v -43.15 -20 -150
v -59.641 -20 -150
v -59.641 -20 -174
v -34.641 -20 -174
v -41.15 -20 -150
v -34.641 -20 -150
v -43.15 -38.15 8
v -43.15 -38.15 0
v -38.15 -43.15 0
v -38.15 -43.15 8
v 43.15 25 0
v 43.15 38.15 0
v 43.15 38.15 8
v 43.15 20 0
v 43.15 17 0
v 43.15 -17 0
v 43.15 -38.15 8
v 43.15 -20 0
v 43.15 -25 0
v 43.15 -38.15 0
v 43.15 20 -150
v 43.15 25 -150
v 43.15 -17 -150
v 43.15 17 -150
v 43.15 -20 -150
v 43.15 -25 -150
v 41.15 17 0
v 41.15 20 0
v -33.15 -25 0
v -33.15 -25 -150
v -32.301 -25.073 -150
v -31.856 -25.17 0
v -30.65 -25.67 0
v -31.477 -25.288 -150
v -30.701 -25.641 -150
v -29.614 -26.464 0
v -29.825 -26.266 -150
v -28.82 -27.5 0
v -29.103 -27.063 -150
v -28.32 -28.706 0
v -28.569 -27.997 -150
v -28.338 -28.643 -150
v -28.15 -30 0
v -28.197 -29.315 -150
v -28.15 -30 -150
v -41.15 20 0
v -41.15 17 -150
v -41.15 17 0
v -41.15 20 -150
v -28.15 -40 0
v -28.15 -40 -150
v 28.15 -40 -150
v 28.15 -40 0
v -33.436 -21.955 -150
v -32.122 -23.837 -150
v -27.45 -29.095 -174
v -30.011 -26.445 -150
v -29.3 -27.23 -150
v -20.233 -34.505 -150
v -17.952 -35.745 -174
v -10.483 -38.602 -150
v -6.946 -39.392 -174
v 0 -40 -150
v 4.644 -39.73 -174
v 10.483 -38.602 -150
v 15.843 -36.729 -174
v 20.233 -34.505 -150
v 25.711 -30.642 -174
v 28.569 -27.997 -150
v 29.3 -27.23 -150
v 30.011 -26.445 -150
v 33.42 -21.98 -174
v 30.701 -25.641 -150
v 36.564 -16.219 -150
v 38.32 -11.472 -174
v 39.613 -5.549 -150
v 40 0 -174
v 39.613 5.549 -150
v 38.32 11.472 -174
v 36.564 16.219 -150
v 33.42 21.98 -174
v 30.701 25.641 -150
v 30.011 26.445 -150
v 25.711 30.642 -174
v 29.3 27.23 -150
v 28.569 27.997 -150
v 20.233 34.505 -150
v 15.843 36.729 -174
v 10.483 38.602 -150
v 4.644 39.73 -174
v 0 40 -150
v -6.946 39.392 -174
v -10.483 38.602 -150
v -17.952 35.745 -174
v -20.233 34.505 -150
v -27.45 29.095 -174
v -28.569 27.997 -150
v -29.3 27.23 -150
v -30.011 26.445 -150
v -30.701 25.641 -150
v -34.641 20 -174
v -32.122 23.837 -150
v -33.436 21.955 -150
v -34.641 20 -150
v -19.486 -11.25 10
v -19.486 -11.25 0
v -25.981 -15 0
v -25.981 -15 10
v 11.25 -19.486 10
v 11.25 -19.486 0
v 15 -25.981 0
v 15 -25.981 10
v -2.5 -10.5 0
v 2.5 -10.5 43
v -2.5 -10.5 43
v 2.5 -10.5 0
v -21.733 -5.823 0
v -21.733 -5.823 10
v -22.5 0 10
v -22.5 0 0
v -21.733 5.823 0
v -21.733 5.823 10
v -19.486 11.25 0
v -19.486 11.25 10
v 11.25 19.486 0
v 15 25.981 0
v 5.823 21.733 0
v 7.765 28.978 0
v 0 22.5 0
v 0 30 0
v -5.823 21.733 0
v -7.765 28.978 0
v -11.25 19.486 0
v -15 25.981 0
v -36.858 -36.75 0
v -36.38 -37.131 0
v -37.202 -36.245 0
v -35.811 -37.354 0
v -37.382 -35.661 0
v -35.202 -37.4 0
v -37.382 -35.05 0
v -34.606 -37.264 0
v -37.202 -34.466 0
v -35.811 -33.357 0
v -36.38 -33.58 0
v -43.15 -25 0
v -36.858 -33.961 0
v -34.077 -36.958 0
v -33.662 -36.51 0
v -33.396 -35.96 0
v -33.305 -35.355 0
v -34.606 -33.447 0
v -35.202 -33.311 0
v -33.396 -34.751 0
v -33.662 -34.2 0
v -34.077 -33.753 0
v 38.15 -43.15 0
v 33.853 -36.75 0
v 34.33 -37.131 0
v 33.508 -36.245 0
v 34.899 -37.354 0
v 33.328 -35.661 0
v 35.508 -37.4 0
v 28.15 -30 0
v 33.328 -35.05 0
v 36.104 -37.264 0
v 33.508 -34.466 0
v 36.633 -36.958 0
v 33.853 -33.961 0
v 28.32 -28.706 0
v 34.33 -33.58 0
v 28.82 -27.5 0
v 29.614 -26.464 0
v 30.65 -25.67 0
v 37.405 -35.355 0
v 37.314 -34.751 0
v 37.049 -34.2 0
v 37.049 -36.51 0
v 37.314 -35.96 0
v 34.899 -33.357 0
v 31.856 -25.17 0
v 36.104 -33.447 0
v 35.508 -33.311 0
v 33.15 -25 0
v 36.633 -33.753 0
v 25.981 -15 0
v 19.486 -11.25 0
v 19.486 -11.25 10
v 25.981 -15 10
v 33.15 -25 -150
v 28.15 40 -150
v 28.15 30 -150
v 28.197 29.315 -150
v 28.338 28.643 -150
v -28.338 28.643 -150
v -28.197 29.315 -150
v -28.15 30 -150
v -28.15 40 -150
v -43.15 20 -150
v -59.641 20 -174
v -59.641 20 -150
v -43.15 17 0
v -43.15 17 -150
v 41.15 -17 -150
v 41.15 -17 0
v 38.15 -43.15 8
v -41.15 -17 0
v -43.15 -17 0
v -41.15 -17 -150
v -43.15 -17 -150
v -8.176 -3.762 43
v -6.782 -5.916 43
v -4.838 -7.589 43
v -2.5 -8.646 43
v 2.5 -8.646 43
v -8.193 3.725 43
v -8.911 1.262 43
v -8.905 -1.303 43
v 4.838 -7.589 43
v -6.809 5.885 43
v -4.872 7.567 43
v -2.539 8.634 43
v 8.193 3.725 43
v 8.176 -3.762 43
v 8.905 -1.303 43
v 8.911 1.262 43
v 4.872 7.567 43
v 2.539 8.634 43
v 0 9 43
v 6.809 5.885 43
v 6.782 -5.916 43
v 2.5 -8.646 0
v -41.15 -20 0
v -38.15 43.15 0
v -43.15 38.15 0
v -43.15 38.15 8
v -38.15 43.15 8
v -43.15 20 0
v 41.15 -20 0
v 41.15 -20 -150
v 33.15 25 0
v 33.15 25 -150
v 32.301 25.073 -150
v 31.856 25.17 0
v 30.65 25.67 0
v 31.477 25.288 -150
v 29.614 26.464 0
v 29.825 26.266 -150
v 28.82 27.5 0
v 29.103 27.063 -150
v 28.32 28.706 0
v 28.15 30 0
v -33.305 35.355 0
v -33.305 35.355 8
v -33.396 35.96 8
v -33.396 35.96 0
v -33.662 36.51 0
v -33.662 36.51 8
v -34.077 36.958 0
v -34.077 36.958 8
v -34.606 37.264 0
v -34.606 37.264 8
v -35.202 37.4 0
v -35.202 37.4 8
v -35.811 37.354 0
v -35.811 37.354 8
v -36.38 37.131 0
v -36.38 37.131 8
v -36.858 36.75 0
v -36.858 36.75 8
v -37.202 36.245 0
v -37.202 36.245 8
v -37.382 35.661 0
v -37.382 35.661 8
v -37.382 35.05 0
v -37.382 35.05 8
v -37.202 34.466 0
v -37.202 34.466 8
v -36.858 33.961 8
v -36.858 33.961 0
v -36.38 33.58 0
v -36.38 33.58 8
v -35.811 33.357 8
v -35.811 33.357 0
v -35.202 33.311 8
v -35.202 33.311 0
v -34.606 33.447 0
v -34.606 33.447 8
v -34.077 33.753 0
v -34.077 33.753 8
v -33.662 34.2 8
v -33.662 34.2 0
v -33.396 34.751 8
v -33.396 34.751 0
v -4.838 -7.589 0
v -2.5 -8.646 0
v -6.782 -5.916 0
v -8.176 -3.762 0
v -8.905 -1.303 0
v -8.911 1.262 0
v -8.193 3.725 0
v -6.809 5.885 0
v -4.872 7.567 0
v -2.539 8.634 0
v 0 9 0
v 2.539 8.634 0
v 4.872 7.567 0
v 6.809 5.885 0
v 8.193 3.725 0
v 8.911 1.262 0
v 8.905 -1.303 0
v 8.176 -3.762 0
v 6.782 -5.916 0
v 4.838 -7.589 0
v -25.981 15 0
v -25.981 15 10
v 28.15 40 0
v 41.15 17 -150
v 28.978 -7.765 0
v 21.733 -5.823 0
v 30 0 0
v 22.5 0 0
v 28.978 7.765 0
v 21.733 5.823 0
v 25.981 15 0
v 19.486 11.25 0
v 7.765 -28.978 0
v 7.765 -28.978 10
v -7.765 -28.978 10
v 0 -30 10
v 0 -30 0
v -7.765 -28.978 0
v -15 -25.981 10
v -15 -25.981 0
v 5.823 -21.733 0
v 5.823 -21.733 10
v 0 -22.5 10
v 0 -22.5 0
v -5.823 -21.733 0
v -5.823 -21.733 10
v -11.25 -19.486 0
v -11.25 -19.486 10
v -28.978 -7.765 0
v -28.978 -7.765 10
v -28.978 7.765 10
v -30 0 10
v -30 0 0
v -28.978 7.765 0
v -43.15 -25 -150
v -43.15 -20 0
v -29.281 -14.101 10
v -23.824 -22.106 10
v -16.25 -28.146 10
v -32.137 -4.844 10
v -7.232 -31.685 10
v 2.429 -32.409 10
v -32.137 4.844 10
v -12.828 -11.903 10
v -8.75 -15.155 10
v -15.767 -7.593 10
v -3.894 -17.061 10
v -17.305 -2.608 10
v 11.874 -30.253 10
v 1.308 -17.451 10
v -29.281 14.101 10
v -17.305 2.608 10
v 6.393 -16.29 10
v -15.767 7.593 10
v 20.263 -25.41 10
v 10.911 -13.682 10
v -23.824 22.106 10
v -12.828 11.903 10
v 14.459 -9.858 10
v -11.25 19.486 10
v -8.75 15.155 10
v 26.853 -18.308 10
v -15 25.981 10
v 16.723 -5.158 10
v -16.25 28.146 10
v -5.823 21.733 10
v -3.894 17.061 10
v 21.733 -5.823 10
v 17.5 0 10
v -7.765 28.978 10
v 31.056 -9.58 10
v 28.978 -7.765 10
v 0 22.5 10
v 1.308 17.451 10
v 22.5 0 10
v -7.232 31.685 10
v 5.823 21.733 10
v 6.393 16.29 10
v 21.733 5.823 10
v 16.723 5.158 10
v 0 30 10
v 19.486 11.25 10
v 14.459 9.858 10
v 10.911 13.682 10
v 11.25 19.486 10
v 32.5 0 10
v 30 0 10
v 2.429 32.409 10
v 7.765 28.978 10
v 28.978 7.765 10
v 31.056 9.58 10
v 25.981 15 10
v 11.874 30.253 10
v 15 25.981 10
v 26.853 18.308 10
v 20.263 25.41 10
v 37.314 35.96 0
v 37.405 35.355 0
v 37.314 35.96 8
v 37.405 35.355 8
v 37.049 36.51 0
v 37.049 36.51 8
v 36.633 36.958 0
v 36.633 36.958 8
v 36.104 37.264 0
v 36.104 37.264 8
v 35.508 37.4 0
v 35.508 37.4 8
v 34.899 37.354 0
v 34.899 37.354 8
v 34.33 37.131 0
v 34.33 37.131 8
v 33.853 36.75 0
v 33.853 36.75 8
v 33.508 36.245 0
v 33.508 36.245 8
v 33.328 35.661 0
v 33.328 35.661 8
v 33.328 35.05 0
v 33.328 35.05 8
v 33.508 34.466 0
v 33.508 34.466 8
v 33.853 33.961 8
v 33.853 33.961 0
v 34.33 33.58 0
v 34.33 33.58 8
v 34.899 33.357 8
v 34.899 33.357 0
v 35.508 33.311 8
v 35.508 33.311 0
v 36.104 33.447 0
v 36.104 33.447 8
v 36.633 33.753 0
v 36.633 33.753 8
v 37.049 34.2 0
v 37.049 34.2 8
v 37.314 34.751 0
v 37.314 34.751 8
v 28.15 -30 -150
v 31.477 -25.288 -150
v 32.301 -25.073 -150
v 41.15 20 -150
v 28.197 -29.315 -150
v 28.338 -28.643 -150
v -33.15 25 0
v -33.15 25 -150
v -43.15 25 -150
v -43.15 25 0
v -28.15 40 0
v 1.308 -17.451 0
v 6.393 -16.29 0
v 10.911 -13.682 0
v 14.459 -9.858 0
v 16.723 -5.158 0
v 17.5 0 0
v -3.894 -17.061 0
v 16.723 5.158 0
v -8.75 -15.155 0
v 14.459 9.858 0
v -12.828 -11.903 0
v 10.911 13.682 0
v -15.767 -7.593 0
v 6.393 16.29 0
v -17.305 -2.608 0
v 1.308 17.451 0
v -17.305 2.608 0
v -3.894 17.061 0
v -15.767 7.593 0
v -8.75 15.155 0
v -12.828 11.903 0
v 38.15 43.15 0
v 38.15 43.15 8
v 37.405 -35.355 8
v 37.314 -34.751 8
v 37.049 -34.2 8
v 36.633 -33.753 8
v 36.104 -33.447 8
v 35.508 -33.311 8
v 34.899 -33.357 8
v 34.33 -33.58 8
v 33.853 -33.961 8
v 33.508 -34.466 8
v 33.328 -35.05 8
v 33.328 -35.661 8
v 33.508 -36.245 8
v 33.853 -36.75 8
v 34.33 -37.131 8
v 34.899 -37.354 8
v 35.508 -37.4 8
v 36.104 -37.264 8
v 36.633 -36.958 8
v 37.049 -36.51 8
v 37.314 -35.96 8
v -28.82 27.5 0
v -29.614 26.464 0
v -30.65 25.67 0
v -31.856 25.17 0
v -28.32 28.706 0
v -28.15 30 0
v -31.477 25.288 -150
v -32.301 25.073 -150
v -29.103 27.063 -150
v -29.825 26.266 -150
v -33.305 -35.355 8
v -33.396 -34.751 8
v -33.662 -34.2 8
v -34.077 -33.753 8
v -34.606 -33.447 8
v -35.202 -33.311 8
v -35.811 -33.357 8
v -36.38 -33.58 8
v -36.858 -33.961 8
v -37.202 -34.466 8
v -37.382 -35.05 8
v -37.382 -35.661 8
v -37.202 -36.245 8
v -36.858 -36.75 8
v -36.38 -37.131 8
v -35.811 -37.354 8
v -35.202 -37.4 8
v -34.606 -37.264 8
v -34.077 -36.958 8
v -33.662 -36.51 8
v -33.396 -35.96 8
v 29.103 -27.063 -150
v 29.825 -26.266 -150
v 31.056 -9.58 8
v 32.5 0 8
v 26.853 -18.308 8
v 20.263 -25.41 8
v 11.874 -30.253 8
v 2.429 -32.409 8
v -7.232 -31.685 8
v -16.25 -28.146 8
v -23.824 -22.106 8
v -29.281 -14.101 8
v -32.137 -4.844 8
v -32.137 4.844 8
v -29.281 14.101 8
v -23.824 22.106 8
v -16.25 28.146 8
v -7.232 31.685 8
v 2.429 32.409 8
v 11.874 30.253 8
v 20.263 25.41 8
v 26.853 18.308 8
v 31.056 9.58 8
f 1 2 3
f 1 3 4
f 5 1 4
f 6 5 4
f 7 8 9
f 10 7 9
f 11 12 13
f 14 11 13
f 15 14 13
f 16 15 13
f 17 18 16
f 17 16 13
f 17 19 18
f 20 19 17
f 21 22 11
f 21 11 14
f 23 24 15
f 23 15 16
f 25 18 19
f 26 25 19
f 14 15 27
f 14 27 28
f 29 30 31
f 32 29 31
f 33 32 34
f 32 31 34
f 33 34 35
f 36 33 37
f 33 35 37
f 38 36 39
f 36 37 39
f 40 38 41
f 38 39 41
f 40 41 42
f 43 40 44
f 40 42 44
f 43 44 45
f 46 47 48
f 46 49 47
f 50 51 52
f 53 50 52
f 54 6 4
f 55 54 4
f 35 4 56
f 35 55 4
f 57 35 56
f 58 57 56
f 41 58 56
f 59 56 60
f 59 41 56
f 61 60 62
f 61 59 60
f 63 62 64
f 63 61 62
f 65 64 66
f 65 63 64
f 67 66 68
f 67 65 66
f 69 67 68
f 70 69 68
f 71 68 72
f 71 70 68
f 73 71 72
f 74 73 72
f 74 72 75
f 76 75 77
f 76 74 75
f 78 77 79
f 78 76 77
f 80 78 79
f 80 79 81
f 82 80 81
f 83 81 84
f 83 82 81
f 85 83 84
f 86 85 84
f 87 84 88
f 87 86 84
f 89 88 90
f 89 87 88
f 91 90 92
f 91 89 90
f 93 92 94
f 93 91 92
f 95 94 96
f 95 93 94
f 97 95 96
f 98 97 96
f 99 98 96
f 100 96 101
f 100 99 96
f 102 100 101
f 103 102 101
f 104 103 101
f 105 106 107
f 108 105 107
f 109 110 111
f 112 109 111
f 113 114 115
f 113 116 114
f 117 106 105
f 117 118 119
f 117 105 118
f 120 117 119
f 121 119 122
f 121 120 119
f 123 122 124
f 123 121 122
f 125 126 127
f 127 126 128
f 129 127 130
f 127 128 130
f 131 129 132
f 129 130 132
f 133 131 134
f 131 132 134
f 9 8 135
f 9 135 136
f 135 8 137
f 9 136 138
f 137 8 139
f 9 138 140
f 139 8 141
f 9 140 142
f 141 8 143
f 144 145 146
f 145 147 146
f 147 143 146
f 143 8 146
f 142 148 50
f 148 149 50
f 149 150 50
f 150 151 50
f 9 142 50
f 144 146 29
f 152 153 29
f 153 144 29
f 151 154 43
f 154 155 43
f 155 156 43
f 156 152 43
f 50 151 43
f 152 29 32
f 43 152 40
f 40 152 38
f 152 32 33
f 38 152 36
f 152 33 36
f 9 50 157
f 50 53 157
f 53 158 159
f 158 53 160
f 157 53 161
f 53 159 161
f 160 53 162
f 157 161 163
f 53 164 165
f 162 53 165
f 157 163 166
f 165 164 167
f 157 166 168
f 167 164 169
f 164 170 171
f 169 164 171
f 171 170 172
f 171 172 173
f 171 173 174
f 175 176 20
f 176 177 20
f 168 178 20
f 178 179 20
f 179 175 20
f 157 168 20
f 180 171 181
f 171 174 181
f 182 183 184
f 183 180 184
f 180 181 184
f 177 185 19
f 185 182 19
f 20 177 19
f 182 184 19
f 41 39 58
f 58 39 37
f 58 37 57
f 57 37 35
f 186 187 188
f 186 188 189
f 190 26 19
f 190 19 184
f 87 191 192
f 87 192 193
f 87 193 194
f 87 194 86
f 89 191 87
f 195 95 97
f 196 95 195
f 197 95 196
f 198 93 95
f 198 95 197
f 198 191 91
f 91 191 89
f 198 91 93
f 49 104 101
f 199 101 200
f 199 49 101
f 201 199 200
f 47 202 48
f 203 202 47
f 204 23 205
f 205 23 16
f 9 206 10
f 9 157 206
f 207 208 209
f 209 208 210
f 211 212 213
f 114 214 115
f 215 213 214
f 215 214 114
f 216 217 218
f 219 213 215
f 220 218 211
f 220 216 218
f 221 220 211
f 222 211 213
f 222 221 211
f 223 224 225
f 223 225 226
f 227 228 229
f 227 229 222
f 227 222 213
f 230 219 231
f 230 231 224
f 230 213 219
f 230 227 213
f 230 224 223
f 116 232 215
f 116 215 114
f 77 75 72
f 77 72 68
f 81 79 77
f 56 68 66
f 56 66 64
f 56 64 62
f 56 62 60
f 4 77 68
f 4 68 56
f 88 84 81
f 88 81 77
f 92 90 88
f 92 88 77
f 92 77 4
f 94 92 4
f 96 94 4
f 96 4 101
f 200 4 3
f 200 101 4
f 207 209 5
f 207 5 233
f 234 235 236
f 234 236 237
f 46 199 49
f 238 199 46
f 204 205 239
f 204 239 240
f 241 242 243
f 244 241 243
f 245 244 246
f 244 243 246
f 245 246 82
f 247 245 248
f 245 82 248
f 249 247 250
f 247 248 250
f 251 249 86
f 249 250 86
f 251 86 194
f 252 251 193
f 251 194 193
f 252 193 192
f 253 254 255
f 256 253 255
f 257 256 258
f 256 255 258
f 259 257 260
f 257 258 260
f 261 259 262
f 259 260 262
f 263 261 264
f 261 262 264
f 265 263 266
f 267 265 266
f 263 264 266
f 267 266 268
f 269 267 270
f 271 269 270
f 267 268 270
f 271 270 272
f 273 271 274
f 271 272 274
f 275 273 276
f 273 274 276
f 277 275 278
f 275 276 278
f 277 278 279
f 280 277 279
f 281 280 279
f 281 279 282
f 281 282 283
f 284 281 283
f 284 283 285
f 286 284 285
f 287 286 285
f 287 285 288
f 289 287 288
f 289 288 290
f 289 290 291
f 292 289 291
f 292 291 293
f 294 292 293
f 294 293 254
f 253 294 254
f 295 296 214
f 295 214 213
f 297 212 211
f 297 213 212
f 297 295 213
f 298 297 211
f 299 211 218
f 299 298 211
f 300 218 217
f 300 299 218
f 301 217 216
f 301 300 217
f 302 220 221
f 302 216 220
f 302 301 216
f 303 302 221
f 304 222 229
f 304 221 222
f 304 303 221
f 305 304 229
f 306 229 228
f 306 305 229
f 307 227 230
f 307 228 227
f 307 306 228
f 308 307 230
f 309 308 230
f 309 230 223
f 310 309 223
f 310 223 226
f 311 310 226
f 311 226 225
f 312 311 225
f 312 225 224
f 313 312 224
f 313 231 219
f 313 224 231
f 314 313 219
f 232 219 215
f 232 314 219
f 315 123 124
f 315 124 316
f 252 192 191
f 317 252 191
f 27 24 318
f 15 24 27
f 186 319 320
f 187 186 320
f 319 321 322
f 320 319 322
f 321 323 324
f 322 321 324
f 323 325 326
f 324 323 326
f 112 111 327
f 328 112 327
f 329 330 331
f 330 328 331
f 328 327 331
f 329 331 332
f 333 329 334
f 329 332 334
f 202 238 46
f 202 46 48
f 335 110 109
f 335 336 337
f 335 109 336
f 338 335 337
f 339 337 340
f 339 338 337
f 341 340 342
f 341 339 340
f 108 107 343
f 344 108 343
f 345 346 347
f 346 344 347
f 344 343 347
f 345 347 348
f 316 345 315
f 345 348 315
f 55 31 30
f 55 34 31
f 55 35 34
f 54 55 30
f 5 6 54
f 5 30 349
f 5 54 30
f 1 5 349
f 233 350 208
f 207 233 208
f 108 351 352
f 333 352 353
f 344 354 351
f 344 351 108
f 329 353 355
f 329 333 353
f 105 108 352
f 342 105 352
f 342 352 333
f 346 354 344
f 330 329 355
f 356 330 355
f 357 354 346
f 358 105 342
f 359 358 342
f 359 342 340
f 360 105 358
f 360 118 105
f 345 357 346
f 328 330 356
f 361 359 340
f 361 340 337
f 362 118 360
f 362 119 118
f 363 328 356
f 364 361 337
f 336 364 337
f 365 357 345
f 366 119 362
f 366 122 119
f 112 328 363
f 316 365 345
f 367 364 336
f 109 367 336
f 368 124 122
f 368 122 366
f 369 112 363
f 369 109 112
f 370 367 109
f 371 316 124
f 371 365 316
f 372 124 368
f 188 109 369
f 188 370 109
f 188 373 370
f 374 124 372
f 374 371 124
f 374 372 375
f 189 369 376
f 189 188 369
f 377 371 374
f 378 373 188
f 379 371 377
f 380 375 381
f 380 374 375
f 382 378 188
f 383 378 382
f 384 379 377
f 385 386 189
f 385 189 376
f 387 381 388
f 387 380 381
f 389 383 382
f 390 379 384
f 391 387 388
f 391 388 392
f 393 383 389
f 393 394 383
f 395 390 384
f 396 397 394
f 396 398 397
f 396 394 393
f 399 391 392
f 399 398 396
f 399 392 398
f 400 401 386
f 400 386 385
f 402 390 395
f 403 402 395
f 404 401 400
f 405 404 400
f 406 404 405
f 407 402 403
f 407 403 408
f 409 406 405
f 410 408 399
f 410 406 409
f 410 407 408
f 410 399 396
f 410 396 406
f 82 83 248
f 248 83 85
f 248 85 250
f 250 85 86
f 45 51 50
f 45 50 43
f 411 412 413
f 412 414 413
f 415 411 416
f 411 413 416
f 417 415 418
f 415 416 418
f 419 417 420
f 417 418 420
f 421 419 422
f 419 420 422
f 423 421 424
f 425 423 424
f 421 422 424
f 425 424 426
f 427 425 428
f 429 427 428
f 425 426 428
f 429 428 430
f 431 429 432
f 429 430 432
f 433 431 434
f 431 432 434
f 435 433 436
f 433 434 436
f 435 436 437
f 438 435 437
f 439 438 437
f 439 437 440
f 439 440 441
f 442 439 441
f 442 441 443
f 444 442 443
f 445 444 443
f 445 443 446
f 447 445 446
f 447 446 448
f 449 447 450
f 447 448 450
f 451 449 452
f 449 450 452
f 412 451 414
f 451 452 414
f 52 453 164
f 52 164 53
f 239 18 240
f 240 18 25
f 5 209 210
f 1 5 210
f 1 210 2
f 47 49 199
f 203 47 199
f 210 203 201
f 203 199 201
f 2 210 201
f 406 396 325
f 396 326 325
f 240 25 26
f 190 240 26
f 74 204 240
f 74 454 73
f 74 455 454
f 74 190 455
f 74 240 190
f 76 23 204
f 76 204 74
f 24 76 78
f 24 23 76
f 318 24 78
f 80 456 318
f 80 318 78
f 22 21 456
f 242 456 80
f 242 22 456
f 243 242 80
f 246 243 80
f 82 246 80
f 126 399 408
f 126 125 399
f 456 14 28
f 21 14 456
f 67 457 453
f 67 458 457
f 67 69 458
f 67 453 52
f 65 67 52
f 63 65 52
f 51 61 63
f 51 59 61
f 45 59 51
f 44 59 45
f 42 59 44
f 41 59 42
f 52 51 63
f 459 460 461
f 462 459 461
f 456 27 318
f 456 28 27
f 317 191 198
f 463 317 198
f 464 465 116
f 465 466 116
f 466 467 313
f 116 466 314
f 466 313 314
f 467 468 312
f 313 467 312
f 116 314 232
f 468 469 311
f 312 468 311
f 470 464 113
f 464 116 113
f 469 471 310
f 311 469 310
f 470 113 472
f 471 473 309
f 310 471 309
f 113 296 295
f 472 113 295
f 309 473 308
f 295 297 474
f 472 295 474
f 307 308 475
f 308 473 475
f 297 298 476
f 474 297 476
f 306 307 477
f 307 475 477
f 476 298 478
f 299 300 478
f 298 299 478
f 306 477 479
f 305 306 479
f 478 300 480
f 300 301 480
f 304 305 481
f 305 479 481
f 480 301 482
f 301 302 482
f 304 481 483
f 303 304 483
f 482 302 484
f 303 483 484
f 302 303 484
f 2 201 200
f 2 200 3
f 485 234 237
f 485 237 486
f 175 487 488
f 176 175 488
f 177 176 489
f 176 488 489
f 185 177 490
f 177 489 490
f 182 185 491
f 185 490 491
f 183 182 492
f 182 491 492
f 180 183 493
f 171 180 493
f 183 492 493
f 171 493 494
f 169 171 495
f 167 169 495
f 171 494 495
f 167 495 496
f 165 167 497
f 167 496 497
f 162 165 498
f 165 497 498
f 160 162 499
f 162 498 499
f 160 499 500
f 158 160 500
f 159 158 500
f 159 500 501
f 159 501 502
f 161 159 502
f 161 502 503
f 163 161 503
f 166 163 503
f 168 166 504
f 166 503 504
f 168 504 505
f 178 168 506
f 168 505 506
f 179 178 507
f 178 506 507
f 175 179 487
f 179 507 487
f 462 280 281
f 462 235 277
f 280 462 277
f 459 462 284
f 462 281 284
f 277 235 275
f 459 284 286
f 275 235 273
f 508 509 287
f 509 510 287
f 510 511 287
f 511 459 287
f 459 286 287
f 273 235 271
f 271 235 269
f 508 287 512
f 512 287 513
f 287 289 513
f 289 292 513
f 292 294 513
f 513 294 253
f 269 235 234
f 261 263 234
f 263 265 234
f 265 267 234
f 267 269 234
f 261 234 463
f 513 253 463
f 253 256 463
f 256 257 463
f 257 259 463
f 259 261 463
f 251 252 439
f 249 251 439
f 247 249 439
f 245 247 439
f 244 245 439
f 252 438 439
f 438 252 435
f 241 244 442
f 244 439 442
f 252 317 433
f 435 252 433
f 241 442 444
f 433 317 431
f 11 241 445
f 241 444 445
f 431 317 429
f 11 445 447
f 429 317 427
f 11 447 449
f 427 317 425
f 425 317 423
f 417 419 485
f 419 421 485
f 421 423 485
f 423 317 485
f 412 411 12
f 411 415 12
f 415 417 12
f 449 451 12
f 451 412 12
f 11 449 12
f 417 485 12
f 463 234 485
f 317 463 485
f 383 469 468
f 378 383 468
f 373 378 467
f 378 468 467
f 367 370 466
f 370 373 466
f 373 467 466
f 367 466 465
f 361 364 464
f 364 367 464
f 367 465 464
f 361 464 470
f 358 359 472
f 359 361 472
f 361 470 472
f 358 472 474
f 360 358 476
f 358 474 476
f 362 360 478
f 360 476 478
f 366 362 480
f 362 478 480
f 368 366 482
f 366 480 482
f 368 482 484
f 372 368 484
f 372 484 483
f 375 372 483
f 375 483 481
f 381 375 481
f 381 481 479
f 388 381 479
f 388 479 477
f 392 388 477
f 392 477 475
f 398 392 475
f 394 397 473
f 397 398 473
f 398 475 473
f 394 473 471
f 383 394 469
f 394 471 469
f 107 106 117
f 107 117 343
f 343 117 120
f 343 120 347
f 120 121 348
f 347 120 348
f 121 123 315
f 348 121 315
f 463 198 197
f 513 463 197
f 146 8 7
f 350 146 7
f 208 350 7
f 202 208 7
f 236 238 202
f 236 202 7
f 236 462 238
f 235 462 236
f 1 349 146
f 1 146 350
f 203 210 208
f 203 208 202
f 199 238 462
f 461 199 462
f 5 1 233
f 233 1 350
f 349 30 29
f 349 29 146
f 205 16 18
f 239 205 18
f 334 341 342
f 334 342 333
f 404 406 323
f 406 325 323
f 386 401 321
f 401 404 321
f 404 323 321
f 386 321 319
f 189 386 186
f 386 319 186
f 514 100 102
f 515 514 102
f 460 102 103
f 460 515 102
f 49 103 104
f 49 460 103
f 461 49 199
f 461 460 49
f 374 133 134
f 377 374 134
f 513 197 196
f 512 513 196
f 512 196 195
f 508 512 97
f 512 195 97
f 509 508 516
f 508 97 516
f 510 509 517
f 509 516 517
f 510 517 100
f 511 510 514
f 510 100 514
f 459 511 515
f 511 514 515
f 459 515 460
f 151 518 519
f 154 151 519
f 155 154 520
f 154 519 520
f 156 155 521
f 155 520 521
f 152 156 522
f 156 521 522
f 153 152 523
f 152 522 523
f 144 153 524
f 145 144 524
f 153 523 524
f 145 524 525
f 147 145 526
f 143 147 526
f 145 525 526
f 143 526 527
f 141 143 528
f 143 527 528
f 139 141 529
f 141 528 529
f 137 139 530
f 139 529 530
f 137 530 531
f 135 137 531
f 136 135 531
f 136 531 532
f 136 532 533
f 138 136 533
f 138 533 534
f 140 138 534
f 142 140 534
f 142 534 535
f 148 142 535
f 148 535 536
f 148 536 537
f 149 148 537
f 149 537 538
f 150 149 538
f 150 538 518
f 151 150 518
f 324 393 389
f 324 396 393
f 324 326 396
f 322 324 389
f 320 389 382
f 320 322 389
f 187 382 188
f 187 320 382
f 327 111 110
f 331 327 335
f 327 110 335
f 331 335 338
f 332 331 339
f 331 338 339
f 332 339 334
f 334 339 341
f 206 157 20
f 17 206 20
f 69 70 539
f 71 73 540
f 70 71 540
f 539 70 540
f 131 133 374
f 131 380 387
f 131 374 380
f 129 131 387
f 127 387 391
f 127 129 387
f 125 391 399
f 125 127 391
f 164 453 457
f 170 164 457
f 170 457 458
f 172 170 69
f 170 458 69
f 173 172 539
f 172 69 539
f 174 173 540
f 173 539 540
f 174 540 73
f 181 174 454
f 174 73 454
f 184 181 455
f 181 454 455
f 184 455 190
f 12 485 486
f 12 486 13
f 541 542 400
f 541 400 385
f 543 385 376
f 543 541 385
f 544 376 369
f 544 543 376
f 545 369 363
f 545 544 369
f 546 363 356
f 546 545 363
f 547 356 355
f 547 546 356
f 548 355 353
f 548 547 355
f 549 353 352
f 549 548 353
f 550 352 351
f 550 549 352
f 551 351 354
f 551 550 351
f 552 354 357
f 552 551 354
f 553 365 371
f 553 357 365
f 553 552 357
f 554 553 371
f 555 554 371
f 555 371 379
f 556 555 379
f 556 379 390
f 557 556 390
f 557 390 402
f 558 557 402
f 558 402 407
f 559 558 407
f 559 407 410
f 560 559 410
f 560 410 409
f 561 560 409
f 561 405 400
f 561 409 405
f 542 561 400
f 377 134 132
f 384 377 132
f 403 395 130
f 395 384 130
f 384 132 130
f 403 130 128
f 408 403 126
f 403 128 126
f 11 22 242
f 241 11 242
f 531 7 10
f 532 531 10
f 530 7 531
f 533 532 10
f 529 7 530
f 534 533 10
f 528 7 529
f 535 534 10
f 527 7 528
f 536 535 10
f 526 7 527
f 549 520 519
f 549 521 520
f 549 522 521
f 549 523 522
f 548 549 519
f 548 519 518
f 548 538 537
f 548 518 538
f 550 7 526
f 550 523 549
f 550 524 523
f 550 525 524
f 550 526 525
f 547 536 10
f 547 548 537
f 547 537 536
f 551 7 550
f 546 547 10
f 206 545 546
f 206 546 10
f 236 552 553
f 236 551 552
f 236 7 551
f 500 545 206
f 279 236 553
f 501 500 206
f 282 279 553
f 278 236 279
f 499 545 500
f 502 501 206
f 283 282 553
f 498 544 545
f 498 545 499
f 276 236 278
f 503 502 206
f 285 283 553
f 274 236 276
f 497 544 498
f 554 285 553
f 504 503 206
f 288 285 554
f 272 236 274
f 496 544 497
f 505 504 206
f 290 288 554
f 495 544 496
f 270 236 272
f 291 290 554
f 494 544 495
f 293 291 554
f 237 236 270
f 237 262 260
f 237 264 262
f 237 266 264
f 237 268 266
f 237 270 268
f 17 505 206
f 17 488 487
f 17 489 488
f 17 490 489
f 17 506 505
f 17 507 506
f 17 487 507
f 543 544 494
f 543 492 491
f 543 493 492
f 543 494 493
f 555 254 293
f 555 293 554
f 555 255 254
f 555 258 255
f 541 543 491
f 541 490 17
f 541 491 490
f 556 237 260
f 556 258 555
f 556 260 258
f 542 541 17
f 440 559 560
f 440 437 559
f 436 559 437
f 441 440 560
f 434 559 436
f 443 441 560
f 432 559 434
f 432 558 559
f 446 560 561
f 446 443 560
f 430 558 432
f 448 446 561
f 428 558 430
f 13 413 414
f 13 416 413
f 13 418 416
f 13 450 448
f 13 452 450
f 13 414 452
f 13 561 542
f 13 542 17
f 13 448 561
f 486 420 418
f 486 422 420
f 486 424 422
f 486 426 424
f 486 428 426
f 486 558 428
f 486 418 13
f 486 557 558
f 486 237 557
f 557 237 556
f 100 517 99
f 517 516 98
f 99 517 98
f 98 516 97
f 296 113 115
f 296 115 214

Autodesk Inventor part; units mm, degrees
ref_plane "YZ Plane" through (0, 0, 0) normal (1, 0, 0) x (0, 1, 0)
ref_plane "XZ Plane" through (0, 0, 0) normal (0, 1, 0) x (-1, 0, 0)
ref_plane "XY Plane" through (0, 0, 0) normal (0, 0, 1) x (1, 0, 0)
sketch "Sketch1" plane through (0, 0, 0) normal (0, 0, 1) x (1, 0, 0)
  line L0 (-38.15, 43.15) -> (38.15, 43.15)
  line L1 (43.15, 38.15) -> (43.15, -38.15)
  line L2 (38.15, -43.15) -> (-38.15, -43.15)
  line L3 (-43.15, -38.15) -> (-43.15, 38.15)
  circle A0 centre (0, 0) radius 32.5
  line L4 (-43.15, 38.15) -> (-38.15, 43.15)
  line L5 (38.15, 43.15) -> (43.15, 38.15)
  line L6 (-43.15, -38.15) -> (-38.15, -43.15)
  line L7 (38.15, -43.15) -> (43.15, -38.15)
  point P0 (-43.15, 43.15)
  point P1 (43.15, -43.15)
  point P2 (43.15, 43.15)
  point P3 (-43.15, -43.15)
  point P4 (-43.15, 0)
  dimension "d0" = 86.3
  dimension "d1" = 86.3
  dimension "d2" = 65
  dimension "d3" = 5
  dimension "d4" = 5
  dimension "d5" = 5
  dimension "d6" = 5
  dimension "d7" = 5
  dimension "d8" = 5
  dimension "d9" = 5
  dimension "d10" = 5
extrude "Extrusion1" add sketch "Sketch1" along normal blind 8
sketch "Sketch2" plane through (0, 0, 0) normal (0, 0, 1) x (1, 0, 0)
  circle A0 centre (0, 0) radius 32.5
  line L0 (11.25, 19.4856) -> (15, 25.9808)
  line L1 (0, 0) -> (30, 0) construction
  line L2 (-11.25, 19.4856) -> (-15, 25.9808)
  line L3 (0, 0) -> (30, 0) construction
  line L4 (-19.4856, -11.25) -> (-25.9808, -15)
  line L5 (-19.4856, 11.25) -> (-25.9808, 15)
  line L6 (11.25, -19.4856) -> (15, -25.9808)
  line L7 (-11.25, -19.4856) -> (-15, -25.9808)
  line L8 (19.4856, 11.25) -> (25.9808, 15)
  line L9 (19.4856, -11.25) -> (25.9808, -15)
  arc A1 (15, 25.9808) -> (-15, 25.9808) centre (0, 0) ccw
  arc A2 (25.9808, -15) -> (25.9808, 15) centre (0, 0) ccw
  arc A3 (-25.9808, 15) -> (-25.9808, -15) centre (0, 0) ccw
  arc A4 (-15, -25.9808) -> (15, -25.9808) centre (0, 0) ccw
  circle A5 centre (0, 0) radius 17.5
  arc A6 (-19.4856, 11.25) -> (-19.4856, -11.25) centre (0, 0) ccw
  arc A7 (-11.25, -19.4856) -> (11.25, -19.4856) centre (0, 0) ccw
  arc A8 (19.4856, -11.25) -> (19.4856, 11.25) centre (0, 0) ccw
  arc A9 (11.25, 19.4856) -> (-11.25, 19.4856) centre (0, 0) ccw
  dimension "d15" = 60
  dimension "d16" = 120
  dimension "d19" = 360
  dimension "d21" = 35
extrude "Extrusion2" add sketch "Sketch2" along normal blind 10
sketch "Sketch3" plane through (0, 0, 0) normal (0, 0, -1) x (-1, 0, 0)
  line L0 (-28.15, 40) -> (28.15, 40)
  line L1 (43.15, 25) -> (43.15, -25)
  line L2 (28.15, -40) -> (-28.15, -40)
  line L3 (-43.15, -25) -> (-43.15, 25)
  line L4 (-43.15, 40) -> (43.15, -40) construction
  line L5 (43.15, 40) -> (-43.15, -40) construction
  line L6 (-43.15, 25) -> (-28.15, 25)
  line L7 (-28.15, 25) -> (-28.15, 40)
  line L8 (28.15, 40) -> (28.15, 25)
  line L9 (28.15, 25) -> (43.15, 25)
  line L10 (-11.6946, 0) -> (10.241, 0) construction
  line L11 (-43.15, -25) -> (-28.15, -25)
  line L12 (-28.15, -25) -> (-28.15, -40)
  line L13 (28.15, -40) -> (28.15, -25)
  line L14 (28.15, -25) -> (43.15, -25)
  point P0 (0, 0)
extrude "Extrusion3" add sketch "Sketch3" along normal blind 150
fillet "Fillet1" radius 5 4 edges at (28.15, 25, -75) (-28.15, 25, -75) (-28.15, -25, -75) (28.15, -25, -75)
sketch "Sketch4" plane through (0, 0, -150) normal (0, 0, -1) x (-1, 0, 0)
  arc A0 (34.641, 20) -> (34.641, -20) centre (0, 0) ccw
  line L0 (34.641, 20) -> (59.641, 20)
  line L1 (59.641, 20) -> (59.641, -20)
  line L2 (59.641, -20) -> (34.641, -20)
  dimension "d34" = 25
  dimension "d35" = 40
extrude "Extrusion4" add sketch "Sketch4" along normal blind 24
sketch "Sketch5" plane through (-43.15, -38.15, 8) normal (-1, 0, 0) x (0, 0, 1)
  line L0 (-158, 12.5091) -> (-158, 63.7909) projected
  line L1 (-158, 18.15) -> (-8, 18.15)
  line L2 (-8, 18.15) -> (-8, 21.15)
  line L3 (-8, 21.15) -> (-158, 21.15)
  line L4 (-158, 21.15) -> (-158, 18.15)
  line L5 (-8, 13.15) -> (-158, 13.15) projected
  line L6 (-158, 58.15) -> (-8, 58.15)
  line L7 (-8, 58.15) -> (-8, 55.15)
  line L8 (-8, 55.15) -> (-158, 55.15)
  line L9 (-158, 55.15) -> (-158, 58.15)
  line L10 (-8, 63.15) -> (-158, 63.15) projected
  point P0 (-8, 38.15)
  dimension "d38" = 3
  dimension "d39" = 5
  dimension "d40" = 3
  dimension "d41" = 5
extrude "Extrusion5" cut sketch "Sketch5" against normal blind 2
mirror "Mirror1" about plane through (0, 0, 0) normal (1, 0, 0) of "Extrusion5"
sketch "Sketch6" plane through (0, 0, 0) normal (0, 0, 1) x (1, 0, 0)
  arc A0 (2.5, -8.6458) -> (-2.5, -8.6458) centre (0, 0) ccw
  line L0 (0, -9) -> (0, -8) construction
  line L1 (0, -8) -> (-2.5, -8) construction
  line L2 (-2.5, -8) -> (0, -8) construction
  line L3 (2.5, -8) -> (2.5, -10.5)
  line L4 (2.5, -10.5) -> (-2.5, -10.5)
  line L5 (-2.5, -10.5) -> (-2.5, -8)
  dimension "d44" = 18
  dimension "d45" = 1
  dimension "d46" = 2.5
  dimension "d47" = 5
  dimension "d48" = 2.5
extrude "Extrusion6" add sketch "Sketch6" along normal blind 43
sketch "Sketch7" plane through (0, 0, 8) normal (0, 0, 1) x (1, 0, 0)
  circle A0 centre (0, 0) radius 50 construction
  line L0 (-43.15, -43.15) -> (43.15, -43.15) construction
  line L1 (43.15, -43.15) -> (43.15, 43.15) construction
  line L2 (43.15, 43.15) -> (-43.15, 43.15) construction
  line L3 (-43.15, 43.15) -> (-43.15, -43.15) construction
  line L4 (-43.15, -43.15) -> (43.15, 43.15) construction
  line L5 (43.15, -43.15) -> (-43.15, 43.15) construction
  circle A1 centre (35.3553, 35.3553) radius 2.05
  circle A2 centre (35.3553, -35.3553) radius 2.05
  circle A3 centre (-35.3553, 35.3553) radius 2.05
  circle A4 centre (-35.3553, -35.3553) radius 2.05
  dimension "d51" = 100
  dimension "d52" = 4.1
  dimension "d53" = 4.1
  dimension "d54" = 4.1
  dimension "d55" = 4.1
extrude "Extrusion7" cut sketch "Sketch7" against normal up to surface (8 mm away)
equation "\"d4\" = d3"
equation "\"d5\" = d3"
equation "\"d6\" = d5"
equation "\"d7\" = d3"
equation "\"d8\" = d7"
equation "\"d9\" = d3"
equation "\"d10\" = d9"
equation "\"d56\" = d52"
properties part number "SERVOMOTOR-1KW"
